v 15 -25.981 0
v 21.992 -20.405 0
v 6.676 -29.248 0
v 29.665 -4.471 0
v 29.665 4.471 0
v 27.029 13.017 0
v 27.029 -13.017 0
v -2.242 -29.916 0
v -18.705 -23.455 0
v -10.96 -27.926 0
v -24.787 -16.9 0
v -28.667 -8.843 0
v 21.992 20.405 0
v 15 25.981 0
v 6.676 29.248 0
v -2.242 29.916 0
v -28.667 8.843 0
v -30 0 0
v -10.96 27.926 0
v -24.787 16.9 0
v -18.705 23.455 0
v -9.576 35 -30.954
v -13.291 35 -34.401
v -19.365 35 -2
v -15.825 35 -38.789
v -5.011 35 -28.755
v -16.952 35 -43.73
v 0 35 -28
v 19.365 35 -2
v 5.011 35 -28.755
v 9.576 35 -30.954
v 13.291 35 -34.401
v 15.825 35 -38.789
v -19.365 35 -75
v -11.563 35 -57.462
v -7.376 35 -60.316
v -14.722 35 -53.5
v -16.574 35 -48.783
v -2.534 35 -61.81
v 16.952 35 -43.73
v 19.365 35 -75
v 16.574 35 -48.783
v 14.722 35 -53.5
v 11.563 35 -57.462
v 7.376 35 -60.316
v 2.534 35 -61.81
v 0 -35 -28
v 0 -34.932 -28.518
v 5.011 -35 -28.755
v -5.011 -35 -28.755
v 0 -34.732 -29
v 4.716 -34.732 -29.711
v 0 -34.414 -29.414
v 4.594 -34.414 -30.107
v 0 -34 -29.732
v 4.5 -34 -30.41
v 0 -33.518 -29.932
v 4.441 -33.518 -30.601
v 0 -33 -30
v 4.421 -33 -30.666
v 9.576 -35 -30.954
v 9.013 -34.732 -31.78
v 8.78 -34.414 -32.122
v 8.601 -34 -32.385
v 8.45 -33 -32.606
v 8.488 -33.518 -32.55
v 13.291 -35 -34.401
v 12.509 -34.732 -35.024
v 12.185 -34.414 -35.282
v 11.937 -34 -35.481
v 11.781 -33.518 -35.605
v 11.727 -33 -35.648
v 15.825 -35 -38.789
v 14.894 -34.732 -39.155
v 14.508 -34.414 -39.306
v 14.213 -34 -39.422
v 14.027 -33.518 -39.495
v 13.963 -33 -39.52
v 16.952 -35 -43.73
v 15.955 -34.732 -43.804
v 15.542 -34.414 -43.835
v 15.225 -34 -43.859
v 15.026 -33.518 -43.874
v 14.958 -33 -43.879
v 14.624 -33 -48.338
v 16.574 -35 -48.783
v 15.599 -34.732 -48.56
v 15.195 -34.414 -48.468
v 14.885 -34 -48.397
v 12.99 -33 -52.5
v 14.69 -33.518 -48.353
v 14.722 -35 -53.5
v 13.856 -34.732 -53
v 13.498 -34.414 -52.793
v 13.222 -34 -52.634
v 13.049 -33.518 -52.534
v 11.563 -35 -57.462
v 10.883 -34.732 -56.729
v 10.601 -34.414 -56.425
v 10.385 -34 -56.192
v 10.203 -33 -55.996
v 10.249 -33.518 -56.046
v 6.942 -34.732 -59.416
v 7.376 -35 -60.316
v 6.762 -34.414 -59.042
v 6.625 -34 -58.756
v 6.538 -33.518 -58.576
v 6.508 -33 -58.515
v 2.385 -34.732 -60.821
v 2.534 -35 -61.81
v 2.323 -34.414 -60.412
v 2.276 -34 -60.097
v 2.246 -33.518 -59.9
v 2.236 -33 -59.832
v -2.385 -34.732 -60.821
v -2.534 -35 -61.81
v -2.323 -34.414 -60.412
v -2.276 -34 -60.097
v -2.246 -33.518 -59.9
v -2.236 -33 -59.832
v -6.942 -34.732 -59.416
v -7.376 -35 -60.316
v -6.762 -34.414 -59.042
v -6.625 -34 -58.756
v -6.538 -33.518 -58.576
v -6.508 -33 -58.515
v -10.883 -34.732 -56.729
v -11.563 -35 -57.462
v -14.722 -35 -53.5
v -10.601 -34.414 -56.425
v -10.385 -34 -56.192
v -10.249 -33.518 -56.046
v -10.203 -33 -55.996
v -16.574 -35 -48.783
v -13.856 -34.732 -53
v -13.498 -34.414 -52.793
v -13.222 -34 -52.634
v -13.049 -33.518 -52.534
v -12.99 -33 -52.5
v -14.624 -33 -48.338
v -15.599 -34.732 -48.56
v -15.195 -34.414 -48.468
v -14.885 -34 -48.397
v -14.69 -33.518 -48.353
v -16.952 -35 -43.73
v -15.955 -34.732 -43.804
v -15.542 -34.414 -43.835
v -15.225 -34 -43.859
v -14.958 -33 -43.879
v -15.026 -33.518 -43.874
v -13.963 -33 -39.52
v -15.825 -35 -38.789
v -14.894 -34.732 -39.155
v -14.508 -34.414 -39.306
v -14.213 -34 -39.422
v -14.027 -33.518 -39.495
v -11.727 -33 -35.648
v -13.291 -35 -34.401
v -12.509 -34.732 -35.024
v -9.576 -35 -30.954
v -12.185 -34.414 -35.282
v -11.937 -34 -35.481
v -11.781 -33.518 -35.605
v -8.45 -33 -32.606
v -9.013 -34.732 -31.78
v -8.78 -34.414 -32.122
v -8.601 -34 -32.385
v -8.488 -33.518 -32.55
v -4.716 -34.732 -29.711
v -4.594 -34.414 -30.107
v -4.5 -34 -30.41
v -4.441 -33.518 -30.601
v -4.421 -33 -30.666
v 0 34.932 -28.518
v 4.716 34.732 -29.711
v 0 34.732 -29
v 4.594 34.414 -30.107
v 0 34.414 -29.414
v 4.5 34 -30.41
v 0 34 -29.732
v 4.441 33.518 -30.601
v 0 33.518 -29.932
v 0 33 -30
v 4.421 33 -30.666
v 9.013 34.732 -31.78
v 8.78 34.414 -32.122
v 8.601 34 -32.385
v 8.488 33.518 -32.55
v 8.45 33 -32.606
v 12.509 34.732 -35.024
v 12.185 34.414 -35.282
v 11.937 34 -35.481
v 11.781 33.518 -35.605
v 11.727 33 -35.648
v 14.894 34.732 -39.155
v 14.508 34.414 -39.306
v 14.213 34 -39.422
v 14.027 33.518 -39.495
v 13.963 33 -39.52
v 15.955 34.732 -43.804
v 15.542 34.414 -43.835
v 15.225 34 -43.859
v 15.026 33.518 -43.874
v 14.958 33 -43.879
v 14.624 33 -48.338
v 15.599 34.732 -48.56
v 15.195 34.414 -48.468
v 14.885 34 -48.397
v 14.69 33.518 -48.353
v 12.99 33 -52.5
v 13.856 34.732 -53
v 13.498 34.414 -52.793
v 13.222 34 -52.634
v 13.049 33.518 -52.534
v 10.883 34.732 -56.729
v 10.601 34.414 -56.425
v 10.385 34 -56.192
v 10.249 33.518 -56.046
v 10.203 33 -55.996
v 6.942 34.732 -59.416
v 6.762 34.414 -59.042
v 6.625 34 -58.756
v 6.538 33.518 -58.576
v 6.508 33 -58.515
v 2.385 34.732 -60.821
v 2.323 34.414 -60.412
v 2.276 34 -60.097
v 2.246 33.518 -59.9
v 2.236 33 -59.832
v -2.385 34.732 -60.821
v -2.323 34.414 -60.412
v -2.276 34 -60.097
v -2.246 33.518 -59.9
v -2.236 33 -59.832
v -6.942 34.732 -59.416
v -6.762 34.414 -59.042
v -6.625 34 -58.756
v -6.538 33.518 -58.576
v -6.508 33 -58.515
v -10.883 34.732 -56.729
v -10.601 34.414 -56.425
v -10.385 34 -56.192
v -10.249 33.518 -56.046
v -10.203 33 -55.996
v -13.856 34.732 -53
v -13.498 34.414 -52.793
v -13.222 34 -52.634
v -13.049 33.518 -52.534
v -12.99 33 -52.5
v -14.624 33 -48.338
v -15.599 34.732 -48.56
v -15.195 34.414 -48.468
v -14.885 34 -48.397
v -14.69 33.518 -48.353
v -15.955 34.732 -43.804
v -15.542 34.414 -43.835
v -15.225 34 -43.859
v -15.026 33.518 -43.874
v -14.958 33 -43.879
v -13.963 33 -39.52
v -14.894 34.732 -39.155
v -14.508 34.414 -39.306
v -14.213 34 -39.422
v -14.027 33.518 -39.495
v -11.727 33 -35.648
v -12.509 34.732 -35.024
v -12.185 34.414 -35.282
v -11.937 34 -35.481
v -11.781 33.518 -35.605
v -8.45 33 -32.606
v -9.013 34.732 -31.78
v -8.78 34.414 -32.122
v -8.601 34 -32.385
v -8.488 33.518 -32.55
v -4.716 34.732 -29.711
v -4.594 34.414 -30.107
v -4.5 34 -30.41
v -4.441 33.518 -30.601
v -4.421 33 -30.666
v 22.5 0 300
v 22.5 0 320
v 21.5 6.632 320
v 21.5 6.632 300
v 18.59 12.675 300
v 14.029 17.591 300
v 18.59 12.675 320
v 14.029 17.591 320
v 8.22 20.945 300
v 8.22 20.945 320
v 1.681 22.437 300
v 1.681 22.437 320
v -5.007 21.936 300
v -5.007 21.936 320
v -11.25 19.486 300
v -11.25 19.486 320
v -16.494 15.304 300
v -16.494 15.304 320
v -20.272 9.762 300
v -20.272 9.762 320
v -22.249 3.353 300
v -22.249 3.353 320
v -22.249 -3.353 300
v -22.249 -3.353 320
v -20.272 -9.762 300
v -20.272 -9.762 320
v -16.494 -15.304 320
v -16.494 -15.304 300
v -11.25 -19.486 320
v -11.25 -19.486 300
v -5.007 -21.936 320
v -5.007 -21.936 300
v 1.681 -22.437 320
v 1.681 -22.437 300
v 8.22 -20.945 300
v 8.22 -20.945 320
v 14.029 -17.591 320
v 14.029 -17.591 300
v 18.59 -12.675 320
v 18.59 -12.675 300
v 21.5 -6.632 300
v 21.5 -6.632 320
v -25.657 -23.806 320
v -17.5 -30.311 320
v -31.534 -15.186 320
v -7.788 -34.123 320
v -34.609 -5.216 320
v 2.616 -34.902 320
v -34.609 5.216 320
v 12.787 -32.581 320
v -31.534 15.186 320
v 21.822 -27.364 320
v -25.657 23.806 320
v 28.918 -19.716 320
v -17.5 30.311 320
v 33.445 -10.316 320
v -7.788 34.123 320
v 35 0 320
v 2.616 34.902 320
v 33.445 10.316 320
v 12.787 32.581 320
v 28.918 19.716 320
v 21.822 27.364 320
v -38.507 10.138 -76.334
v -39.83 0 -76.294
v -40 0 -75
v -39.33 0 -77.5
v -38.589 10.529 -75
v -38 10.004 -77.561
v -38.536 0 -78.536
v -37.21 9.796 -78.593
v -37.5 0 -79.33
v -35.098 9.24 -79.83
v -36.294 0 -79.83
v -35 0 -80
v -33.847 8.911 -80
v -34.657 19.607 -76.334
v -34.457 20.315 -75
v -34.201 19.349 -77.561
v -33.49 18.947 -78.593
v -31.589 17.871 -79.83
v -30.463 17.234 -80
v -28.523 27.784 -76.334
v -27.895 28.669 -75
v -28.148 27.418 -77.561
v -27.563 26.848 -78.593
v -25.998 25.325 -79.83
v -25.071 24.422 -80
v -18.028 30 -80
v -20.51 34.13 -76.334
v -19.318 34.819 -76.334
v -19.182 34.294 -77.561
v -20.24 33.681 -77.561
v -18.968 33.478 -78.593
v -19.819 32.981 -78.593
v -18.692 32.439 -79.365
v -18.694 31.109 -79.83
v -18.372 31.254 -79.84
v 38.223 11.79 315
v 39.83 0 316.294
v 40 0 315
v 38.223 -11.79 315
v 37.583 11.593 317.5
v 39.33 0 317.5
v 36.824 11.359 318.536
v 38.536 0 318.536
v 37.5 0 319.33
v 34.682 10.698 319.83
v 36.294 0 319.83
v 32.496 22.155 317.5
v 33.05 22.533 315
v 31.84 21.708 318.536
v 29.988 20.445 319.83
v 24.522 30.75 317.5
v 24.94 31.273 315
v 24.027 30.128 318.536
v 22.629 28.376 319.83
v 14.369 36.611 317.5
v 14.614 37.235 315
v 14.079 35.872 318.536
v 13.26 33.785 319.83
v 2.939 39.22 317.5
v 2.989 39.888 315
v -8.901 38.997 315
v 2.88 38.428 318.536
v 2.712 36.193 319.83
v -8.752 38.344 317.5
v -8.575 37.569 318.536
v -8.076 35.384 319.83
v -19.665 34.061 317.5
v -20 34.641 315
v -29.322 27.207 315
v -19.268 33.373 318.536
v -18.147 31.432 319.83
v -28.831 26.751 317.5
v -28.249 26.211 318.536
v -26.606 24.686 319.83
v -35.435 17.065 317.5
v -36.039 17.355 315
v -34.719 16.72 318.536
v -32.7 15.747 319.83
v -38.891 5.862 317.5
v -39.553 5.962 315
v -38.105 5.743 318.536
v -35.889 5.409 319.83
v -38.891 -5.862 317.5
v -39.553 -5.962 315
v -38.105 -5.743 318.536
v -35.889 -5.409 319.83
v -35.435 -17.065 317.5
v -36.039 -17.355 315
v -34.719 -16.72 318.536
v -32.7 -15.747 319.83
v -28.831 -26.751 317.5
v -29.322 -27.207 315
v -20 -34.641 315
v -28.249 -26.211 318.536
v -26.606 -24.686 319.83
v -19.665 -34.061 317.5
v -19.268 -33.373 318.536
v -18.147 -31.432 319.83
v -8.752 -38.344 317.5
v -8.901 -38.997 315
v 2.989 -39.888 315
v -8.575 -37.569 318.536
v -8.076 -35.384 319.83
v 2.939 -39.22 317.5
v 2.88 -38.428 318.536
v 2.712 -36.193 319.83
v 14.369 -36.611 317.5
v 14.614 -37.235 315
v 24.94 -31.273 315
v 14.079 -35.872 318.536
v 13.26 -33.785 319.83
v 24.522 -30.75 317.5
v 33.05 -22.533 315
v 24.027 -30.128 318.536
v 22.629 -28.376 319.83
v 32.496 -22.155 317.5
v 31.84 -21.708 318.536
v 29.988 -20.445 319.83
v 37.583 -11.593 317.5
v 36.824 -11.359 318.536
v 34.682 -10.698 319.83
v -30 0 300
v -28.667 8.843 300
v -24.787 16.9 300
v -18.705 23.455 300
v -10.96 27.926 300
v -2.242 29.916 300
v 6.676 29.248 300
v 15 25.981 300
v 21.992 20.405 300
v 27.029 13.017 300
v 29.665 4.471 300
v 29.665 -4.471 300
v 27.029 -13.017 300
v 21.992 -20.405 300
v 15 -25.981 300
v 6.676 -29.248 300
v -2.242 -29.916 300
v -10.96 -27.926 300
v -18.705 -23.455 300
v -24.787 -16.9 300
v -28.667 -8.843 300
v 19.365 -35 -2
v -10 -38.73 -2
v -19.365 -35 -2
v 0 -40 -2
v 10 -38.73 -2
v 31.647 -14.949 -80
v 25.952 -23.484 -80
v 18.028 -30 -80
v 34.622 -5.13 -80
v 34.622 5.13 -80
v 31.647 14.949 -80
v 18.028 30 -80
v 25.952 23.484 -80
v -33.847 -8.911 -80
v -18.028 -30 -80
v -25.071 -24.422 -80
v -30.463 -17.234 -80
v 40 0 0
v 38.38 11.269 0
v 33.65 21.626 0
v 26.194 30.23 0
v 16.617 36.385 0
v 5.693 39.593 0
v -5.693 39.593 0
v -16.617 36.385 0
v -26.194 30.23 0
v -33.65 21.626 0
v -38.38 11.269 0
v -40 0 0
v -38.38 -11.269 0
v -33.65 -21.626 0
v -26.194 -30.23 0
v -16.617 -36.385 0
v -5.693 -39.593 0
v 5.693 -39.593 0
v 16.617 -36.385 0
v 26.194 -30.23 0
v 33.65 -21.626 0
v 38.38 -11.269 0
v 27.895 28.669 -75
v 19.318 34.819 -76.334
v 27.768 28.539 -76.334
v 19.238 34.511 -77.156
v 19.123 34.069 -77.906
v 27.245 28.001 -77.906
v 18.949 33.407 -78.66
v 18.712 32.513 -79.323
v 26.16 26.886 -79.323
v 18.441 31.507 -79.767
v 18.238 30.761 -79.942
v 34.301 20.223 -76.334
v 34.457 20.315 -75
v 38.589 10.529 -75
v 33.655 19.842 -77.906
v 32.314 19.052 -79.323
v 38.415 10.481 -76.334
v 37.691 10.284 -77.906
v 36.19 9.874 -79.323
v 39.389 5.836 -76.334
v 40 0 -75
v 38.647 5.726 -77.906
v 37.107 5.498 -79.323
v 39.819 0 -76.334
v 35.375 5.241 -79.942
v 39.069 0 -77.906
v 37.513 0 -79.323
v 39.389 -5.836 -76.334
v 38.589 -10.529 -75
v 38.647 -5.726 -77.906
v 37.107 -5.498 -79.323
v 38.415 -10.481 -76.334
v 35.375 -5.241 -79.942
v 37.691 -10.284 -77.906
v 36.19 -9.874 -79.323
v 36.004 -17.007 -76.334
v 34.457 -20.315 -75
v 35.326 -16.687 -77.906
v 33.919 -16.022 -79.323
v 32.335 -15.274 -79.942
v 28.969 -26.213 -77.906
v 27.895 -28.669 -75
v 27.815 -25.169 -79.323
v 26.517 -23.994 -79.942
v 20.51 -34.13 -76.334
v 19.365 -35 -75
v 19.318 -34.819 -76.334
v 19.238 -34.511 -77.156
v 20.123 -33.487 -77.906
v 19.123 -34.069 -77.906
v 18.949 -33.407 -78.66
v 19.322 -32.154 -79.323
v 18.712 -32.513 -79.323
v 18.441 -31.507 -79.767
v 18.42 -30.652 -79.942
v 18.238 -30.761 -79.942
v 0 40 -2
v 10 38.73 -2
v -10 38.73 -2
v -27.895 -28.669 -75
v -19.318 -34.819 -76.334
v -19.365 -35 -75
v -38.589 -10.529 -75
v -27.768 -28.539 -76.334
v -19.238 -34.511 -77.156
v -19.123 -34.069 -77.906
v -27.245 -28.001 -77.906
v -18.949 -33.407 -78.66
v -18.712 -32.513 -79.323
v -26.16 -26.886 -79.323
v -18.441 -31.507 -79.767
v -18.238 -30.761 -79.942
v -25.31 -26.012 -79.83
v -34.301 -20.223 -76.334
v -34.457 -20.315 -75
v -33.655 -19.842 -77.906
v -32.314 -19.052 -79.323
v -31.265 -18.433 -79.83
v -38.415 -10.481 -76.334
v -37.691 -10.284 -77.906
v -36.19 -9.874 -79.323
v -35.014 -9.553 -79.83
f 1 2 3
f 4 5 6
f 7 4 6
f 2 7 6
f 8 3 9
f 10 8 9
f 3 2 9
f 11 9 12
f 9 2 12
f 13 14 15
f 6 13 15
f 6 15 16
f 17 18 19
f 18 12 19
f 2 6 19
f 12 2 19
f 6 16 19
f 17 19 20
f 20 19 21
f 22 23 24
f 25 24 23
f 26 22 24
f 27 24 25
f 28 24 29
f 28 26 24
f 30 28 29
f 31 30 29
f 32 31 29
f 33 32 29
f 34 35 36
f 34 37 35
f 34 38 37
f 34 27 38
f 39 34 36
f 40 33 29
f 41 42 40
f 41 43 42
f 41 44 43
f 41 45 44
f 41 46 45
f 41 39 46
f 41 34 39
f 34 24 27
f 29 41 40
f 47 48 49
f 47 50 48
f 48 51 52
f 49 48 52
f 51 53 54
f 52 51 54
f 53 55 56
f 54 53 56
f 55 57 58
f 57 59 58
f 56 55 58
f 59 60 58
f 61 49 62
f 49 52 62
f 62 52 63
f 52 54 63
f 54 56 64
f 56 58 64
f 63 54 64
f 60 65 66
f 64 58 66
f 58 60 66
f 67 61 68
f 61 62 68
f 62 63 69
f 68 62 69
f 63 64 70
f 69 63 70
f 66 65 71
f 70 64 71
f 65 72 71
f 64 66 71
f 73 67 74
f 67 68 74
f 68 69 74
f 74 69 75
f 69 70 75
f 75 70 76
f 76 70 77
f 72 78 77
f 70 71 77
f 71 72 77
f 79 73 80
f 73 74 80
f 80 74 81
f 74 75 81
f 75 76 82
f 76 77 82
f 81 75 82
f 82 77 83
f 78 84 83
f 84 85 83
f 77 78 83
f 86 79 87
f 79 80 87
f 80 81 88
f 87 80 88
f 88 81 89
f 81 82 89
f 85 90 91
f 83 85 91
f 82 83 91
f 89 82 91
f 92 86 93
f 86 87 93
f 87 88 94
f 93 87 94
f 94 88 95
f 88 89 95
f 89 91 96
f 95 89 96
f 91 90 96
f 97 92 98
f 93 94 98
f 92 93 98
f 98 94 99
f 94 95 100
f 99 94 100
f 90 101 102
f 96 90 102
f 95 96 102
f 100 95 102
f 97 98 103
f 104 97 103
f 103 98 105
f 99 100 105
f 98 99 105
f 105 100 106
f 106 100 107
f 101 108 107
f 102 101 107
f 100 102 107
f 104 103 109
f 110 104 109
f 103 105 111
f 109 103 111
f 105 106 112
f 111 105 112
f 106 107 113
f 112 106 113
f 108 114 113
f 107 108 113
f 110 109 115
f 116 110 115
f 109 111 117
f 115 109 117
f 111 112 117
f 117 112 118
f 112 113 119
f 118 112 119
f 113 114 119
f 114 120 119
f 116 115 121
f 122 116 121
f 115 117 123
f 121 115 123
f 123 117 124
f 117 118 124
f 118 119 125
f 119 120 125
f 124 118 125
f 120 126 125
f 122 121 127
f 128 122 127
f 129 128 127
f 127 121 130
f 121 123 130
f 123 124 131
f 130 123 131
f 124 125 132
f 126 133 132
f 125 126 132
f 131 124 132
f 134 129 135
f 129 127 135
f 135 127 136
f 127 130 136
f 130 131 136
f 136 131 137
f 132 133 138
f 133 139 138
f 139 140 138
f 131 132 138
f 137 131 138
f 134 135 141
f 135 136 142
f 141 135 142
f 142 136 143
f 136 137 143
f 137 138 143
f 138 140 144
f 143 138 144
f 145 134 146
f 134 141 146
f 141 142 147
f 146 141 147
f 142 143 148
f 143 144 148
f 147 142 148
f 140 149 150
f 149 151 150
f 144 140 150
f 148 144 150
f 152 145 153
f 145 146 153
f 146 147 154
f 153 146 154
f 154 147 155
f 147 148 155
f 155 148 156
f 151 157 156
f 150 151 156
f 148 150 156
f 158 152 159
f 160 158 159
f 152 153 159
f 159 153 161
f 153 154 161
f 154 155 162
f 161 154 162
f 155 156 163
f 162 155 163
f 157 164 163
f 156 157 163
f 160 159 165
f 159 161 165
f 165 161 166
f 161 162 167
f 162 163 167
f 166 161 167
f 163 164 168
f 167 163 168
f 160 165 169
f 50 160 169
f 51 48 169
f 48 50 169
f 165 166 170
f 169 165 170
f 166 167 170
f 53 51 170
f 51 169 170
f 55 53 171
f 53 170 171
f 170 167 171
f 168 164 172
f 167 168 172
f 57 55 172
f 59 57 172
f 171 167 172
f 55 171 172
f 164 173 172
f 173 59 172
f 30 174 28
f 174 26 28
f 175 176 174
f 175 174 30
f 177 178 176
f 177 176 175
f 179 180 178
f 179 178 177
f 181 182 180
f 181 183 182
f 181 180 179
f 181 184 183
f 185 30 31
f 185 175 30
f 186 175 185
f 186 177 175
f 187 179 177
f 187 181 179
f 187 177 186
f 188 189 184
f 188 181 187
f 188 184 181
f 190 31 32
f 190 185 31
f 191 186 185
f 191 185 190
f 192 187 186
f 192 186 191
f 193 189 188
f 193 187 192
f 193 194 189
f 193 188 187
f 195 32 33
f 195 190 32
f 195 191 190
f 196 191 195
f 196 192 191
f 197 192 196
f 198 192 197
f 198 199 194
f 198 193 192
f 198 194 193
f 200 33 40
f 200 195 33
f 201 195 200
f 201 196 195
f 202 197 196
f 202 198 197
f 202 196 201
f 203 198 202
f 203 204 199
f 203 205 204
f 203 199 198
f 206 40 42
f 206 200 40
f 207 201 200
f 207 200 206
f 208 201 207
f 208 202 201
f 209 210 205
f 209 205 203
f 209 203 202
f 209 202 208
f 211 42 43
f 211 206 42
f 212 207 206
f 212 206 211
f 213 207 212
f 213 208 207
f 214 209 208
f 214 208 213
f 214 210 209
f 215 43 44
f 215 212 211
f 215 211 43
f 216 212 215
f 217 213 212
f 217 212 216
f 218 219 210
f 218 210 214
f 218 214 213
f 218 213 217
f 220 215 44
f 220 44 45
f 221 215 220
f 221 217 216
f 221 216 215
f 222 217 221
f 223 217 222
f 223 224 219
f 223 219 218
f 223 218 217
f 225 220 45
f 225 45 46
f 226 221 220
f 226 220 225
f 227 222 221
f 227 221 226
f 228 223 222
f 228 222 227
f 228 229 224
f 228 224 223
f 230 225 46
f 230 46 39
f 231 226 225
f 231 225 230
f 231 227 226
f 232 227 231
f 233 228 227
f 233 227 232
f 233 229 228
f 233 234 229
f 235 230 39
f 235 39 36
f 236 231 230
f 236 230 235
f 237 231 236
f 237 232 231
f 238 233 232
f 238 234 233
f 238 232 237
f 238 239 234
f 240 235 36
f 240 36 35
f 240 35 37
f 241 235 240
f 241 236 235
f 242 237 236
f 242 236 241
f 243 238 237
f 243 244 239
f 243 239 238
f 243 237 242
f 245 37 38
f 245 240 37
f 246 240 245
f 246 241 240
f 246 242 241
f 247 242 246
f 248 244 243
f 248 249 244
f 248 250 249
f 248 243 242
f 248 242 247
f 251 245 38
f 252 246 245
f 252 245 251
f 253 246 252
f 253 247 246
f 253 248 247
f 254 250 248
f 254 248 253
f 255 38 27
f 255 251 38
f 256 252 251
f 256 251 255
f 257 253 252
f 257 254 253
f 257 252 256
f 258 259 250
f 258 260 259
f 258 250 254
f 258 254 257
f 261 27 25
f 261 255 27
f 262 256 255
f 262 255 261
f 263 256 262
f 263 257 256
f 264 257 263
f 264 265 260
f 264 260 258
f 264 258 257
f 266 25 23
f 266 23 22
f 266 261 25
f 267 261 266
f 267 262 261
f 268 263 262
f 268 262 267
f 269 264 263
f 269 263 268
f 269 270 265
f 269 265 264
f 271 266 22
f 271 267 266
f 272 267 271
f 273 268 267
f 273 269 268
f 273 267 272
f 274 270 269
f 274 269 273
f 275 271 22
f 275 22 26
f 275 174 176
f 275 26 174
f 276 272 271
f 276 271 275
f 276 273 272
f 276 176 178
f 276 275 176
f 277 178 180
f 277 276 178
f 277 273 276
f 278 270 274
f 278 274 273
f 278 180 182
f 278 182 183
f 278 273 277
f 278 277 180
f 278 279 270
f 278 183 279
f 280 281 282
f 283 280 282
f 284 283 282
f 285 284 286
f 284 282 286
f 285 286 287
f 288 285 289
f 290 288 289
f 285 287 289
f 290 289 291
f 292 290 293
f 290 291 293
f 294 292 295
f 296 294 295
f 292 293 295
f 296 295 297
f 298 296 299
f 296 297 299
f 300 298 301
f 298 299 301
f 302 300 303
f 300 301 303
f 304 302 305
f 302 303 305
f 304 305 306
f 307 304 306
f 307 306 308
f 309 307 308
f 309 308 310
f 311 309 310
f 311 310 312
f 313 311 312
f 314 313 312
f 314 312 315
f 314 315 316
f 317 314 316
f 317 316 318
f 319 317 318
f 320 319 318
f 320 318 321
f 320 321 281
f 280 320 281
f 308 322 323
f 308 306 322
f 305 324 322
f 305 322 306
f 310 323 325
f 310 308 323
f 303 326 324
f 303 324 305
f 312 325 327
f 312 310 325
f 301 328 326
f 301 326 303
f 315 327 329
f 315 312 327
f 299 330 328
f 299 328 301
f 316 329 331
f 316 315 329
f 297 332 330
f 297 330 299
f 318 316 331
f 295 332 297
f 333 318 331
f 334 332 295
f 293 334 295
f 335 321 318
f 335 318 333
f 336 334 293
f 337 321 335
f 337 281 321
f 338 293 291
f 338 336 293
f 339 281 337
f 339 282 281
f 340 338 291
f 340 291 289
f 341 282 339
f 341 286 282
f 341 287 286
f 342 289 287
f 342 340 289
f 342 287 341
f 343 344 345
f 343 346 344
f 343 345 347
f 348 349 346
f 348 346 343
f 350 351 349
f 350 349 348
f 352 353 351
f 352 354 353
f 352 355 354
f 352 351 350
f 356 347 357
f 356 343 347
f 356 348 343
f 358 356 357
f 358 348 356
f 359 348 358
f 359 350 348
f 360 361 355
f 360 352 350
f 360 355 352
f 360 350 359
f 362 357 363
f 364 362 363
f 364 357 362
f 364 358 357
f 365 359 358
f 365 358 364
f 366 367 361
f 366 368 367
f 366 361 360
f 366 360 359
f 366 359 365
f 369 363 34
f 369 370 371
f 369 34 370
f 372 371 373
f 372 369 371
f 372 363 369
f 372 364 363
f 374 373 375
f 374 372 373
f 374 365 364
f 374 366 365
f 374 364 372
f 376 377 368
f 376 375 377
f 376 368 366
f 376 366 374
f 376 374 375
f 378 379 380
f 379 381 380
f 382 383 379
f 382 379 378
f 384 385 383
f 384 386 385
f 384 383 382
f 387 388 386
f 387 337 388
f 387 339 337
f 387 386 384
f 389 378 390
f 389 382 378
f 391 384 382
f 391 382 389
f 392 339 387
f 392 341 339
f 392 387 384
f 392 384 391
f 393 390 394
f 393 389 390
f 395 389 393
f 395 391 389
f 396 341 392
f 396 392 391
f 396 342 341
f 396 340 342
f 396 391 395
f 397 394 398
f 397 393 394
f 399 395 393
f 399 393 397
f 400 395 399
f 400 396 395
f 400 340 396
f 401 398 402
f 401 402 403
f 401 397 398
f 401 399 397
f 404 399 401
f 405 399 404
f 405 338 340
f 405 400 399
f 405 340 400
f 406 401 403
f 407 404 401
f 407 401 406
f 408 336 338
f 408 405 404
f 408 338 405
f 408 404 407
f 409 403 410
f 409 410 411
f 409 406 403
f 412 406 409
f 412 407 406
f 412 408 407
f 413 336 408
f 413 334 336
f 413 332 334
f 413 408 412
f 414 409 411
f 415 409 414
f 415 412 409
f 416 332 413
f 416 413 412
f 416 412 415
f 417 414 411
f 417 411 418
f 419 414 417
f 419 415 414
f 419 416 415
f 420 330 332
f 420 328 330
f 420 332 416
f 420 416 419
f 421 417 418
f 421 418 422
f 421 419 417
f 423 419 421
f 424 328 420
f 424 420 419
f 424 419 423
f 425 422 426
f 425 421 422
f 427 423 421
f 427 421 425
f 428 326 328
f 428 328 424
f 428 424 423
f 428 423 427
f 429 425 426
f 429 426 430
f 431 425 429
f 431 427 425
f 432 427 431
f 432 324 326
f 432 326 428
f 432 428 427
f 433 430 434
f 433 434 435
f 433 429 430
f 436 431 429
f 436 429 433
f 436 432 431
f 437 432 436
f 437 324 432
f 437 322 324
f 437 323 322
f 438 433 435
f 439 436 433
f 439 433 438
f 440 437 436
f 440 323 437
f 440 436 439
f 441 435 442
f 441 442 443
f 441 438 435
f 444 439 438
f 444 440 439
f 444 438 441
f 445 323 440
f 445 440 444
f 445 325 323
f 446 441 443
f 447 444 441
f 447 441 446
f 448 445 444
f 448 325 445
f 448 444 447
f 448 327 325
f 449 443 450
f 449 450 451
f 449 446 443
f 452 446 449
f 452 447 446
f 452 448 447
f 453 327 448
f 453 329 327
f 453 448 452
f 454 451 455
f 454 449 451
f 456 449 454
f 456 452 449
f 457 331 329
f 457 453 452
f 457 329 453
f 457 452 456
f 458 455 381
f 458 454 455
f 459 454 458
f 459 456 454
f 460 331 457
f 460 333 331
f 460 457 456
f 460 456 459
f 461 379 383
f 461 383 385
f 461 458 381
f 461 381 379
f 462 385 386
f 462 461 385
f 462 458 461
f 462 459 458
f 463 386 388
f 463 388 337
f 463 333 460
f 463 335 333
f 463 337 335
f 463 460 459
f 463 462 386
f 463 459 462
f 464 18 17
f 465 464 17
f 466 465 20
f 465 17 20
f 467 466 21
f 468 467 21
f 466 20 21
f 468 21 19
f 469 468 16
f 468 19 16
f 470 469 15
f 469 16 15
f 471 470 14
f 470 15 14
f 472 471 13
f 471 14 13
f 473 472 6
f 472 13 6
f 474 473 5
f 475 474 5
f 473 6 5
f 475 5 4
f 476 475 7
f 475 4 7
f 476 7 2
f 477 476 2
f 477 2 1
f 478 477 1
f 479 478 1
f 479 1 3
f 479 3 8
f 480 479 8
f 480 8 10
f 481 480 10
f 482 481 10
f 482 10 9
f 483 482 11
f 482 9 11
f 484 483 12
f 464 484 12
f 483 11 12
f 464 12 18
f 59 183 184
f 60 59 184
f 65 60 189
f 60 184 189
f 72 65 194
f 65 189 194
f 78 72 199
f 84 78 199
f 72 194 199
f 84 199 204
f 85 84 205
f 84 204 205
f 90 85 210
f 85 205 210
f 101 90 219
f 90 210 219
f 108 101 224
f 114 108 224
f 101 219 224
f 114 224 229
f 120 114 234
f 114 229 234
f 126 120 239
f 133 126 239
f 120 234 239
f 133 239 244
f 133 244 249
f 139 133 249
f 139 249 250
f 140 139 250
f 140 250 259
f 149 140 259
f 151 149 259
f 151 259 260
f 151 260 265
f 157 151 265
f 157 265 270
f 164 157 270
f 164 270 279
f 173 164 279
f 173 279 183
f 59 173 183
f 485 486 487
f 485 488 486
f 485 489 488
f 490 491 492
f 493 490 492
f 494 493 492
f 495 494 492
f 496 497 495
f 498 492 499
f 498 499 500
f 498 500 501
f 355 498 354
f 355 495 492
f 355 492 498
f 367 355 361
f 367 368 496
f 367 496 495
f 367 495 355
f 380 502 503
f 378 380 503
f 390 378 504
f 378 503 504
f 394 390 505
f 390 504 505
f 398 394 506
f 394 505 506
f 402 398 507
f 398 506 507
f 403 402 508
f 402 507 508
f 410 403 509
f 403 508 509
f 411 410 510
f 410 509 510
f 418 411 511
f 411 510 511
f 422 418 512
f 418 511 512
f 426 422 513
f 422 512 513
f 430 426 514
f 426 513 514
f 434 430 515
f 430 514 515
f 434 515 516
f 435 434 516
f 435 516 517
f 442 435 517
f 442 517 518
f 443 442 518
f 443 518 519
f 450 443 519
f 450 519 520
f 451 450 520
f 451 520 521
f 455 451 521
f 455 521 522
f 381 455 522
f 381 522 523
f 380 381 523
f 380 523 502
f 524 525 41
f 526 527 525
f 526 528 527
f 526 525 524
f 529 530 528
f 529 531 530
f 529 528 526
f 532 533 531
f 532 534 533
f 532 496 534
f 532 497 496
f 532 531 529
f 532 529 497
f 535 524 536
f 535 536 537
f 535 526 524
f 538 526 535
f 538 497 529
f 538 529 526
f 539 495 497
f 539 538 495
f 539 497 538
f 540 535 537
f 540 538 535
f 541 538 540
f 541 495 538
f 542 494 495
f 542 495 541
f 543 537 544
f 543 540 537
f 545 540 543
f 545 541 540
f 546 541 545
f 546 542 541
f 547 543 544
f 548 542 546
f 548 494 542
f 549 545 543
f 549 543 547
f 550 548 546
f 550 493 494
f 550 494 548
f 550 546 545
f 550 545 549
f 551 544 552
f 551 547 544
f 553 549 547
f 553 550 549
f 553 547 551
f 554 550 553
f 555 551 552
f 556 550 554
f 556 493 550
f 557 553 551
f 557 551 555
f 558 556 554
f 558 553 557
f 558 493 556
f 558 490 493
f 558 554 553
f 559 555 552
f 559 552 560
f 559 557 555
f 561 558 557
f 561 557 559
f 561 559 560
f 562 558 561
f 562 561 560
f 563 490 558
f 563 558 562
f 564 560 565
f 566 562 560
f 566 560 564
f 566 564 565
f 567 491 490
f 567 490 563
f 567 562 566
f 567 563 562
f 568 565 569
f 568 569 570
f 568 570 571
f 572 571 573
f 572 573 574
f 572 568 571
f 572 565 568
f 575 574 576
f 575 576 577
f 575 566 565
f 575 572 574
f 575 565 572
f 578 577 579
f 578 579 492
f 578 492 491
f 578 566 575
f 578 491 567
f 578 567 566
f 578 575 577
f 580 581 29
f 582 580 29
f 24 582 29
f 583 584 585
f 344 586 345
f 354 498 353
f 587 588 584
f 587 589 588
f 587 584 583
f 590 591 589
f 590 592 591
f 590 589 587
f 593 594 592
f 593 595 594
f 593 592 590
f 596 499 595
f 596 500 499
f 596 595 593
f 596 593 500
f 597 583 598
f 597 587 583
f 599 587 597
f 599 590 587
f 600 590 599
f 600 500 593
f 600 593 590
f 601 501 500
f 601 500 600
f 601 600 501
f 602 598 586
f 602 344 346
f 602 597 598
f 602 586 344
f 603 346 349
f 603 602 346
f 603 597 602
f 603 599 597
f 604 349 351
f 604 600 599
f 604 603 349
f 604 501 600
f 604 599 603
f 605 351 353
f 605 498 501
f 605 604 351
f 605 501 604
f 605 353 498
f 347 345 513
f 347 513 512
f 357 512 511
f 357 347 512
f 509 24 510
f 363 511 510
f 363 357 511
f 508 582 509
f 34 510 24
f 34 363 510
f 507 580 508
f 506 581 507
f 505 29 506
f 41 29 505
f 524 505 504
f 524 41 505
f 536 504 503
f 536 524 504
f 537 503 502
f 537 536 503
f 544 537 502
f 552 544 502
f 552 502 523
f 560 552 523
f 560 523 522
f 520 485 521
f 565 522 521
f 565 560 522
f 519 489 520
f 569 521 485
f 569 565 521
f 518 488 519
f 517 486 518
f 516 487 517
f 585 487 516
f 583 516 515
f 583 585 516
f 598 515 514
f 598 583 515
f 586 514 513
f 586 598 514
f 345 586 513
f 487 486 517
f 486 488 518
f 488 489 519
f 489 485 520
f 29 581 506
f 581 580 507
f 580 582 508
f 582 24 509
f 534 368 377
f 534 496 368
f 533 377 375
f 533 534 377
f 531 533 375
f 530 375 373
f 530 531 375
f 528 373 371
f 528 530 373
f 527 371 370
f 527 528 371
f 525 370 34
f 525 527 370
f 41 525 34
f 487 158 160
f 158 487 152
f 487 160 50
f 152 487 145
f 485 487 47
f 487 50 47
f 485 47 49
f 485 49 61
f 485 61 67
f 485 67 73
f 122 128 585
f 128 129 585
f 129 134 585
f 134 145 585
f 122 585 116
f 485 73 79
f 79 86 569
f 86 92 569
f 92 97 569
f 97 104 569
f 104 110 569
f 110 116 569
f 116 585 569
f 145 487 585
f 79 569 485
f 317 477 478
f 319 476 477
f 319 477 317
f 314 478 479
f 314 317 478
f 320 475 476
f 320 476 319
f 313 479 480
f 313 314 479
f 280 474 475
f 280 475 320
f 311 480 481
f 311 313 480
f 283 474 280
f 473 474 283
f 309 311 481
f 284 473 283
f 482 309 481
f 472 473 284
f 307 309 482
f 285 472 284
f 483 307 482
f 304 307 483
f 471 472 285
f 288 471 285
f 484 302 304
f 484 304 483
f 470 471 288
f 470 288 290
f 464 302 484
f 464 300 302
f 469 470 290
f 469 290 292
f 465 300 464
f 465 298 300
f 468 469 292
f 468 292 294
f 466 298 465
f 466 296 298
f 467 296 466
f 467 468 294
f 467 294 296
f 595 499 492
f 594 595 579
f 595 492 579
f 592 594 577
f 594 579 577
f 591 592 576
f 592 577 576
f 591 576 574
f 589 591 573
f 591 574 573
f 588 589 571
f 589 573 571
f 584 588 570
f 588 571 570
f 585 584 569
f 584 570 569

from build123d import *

# Parameters (mm, degrees)
SKETCH2_R           = 40
BOSS_EXTRUDE1_DEPTH = 320
SKETCH3_R           = 30
CUT_EXTRUDE1_DEPTH  = 300
CUT_EXTRUDE2_REACH  = 326.962
SKETCH4_R           = 22.5
BOSS_EXTRUDE2_START = 80
SKETCH5_R           = 40
BOSS_EXTRUDE2_DEPTH = 80
SKETCH6_W           = 40
SKETCH6_H           = 78
CUT_EXTRUDE3_DEPTH  = 5
SKETCH7_R           = 15
CUT_EXTRUDE4_DEPTH  = 332.096662623
FILLET2_R           = 5
FILLET3_R           = 2


with BuildPart() as part:
    # Sketch2 → Boss-Extrude1 (new body)
    with BuildSketch(Plane.XY):
        Circle(SKETCH2_R)
    extrude(amount=BOSS_EXTRUDE1_DEPTH)

    # Sketch3 → Cut-Extrude1 (cut)
    with BuildSketch(Plane(origin=(0, 0, 0), x_dir=(-1, 0, 0), z_dir=(0, 0, -1))):
        Circle(SKETCH3_R)
    extrude(amount=-CUT_EXTRUDE1_DEPTH, mode=Mode.SUBTRACT)

    # Sketch4 → Cut-Extrude2 (cut, up to next)
    with BuildSketch(Plane.XY.offset(320), mode=Mode.PRIVATE) as cut_extrude2_sk1:
        Circle(SKETCH4_R)
    cut_extrude2_tool1 = extrude(cut_extrude2_sk1.sketch, amount=-CUT_EXTRUDE2_REACH, mode=Mode.PRIVATE) & part.part
    add(cut_extrude2_tool1.solids().sort_by_distance((0, 0, 320))[0], mode=Mode.SUBTRACT)

    # Sketch5 → Boss-Extrude2 (add)
    with BuildSketch(Plane(origin=(0, 0, 0), x_dir=(-1, 0, 0), z_dir=(0, 0, -1)).offset(BOSS_EXTRUDE2_START)):
        Circle(SKETCH5_R)
    extrude(amount=-BOSS_EXTRUDE2_DEPTH)

    # Sketch6 → Cut-Extrude3 (cut)
    with BuildSketch(Plane(origin=(0, 40, 0), x_dir=(1, 0, 0), z_dir=(0, 1, 0))):
        with Locations((0, 41)):
            Rectangle(SKETCH6_W, SKETCH6_H)
    cut_extrude3 = extrude(amount=-CUT_EXTRUDE3_DEPTH, mode=Mode.SUBTRACT)

    # Mirror1: Cut-Extrude3 across plane
    add(cut_extrude3.mirror(Plane.ZX), mode=Mode.SUBTRACT)

    # Sketch7 → Cut-Extrude4 (cut, through all)
    with BuildSketch(Plane(origin=(0, 35, 0), x_dir=(1, 0, 0), z_dir=(0, 1, 0))):
        with Locations(Location((0, 45, 0), (0, 0, 270))):
            Circle(SKETCH7_R)
    extrude(amount=-CUT_EXTRUDE4_DEPTH, mode=Mode.SUBTRACT)

    # Fillet2
    fillet2_edges = [part.edges().sort_by_distance(p)[0] for p in [
        (40, 0, -80),
        (0, 35, -80),
        (-34.457195687, 20.315060063, -80),
        (0, -35, -80),
        (-40, 0, 320),
    ]]
    fillet(fillet2_edges, radius=FILLET2_R - 0.0001)  # a hair under: the kernel refuses the full size

    # Fillet3
    fillet3_edges = [part.edges().sort_by_distance(p)[0] for p in [
        (0, -35, -60),
        (0, 35, -60),
    ]]
    fillet(fillet3_edges, radius=FILLET3_R)


solid = part.part
